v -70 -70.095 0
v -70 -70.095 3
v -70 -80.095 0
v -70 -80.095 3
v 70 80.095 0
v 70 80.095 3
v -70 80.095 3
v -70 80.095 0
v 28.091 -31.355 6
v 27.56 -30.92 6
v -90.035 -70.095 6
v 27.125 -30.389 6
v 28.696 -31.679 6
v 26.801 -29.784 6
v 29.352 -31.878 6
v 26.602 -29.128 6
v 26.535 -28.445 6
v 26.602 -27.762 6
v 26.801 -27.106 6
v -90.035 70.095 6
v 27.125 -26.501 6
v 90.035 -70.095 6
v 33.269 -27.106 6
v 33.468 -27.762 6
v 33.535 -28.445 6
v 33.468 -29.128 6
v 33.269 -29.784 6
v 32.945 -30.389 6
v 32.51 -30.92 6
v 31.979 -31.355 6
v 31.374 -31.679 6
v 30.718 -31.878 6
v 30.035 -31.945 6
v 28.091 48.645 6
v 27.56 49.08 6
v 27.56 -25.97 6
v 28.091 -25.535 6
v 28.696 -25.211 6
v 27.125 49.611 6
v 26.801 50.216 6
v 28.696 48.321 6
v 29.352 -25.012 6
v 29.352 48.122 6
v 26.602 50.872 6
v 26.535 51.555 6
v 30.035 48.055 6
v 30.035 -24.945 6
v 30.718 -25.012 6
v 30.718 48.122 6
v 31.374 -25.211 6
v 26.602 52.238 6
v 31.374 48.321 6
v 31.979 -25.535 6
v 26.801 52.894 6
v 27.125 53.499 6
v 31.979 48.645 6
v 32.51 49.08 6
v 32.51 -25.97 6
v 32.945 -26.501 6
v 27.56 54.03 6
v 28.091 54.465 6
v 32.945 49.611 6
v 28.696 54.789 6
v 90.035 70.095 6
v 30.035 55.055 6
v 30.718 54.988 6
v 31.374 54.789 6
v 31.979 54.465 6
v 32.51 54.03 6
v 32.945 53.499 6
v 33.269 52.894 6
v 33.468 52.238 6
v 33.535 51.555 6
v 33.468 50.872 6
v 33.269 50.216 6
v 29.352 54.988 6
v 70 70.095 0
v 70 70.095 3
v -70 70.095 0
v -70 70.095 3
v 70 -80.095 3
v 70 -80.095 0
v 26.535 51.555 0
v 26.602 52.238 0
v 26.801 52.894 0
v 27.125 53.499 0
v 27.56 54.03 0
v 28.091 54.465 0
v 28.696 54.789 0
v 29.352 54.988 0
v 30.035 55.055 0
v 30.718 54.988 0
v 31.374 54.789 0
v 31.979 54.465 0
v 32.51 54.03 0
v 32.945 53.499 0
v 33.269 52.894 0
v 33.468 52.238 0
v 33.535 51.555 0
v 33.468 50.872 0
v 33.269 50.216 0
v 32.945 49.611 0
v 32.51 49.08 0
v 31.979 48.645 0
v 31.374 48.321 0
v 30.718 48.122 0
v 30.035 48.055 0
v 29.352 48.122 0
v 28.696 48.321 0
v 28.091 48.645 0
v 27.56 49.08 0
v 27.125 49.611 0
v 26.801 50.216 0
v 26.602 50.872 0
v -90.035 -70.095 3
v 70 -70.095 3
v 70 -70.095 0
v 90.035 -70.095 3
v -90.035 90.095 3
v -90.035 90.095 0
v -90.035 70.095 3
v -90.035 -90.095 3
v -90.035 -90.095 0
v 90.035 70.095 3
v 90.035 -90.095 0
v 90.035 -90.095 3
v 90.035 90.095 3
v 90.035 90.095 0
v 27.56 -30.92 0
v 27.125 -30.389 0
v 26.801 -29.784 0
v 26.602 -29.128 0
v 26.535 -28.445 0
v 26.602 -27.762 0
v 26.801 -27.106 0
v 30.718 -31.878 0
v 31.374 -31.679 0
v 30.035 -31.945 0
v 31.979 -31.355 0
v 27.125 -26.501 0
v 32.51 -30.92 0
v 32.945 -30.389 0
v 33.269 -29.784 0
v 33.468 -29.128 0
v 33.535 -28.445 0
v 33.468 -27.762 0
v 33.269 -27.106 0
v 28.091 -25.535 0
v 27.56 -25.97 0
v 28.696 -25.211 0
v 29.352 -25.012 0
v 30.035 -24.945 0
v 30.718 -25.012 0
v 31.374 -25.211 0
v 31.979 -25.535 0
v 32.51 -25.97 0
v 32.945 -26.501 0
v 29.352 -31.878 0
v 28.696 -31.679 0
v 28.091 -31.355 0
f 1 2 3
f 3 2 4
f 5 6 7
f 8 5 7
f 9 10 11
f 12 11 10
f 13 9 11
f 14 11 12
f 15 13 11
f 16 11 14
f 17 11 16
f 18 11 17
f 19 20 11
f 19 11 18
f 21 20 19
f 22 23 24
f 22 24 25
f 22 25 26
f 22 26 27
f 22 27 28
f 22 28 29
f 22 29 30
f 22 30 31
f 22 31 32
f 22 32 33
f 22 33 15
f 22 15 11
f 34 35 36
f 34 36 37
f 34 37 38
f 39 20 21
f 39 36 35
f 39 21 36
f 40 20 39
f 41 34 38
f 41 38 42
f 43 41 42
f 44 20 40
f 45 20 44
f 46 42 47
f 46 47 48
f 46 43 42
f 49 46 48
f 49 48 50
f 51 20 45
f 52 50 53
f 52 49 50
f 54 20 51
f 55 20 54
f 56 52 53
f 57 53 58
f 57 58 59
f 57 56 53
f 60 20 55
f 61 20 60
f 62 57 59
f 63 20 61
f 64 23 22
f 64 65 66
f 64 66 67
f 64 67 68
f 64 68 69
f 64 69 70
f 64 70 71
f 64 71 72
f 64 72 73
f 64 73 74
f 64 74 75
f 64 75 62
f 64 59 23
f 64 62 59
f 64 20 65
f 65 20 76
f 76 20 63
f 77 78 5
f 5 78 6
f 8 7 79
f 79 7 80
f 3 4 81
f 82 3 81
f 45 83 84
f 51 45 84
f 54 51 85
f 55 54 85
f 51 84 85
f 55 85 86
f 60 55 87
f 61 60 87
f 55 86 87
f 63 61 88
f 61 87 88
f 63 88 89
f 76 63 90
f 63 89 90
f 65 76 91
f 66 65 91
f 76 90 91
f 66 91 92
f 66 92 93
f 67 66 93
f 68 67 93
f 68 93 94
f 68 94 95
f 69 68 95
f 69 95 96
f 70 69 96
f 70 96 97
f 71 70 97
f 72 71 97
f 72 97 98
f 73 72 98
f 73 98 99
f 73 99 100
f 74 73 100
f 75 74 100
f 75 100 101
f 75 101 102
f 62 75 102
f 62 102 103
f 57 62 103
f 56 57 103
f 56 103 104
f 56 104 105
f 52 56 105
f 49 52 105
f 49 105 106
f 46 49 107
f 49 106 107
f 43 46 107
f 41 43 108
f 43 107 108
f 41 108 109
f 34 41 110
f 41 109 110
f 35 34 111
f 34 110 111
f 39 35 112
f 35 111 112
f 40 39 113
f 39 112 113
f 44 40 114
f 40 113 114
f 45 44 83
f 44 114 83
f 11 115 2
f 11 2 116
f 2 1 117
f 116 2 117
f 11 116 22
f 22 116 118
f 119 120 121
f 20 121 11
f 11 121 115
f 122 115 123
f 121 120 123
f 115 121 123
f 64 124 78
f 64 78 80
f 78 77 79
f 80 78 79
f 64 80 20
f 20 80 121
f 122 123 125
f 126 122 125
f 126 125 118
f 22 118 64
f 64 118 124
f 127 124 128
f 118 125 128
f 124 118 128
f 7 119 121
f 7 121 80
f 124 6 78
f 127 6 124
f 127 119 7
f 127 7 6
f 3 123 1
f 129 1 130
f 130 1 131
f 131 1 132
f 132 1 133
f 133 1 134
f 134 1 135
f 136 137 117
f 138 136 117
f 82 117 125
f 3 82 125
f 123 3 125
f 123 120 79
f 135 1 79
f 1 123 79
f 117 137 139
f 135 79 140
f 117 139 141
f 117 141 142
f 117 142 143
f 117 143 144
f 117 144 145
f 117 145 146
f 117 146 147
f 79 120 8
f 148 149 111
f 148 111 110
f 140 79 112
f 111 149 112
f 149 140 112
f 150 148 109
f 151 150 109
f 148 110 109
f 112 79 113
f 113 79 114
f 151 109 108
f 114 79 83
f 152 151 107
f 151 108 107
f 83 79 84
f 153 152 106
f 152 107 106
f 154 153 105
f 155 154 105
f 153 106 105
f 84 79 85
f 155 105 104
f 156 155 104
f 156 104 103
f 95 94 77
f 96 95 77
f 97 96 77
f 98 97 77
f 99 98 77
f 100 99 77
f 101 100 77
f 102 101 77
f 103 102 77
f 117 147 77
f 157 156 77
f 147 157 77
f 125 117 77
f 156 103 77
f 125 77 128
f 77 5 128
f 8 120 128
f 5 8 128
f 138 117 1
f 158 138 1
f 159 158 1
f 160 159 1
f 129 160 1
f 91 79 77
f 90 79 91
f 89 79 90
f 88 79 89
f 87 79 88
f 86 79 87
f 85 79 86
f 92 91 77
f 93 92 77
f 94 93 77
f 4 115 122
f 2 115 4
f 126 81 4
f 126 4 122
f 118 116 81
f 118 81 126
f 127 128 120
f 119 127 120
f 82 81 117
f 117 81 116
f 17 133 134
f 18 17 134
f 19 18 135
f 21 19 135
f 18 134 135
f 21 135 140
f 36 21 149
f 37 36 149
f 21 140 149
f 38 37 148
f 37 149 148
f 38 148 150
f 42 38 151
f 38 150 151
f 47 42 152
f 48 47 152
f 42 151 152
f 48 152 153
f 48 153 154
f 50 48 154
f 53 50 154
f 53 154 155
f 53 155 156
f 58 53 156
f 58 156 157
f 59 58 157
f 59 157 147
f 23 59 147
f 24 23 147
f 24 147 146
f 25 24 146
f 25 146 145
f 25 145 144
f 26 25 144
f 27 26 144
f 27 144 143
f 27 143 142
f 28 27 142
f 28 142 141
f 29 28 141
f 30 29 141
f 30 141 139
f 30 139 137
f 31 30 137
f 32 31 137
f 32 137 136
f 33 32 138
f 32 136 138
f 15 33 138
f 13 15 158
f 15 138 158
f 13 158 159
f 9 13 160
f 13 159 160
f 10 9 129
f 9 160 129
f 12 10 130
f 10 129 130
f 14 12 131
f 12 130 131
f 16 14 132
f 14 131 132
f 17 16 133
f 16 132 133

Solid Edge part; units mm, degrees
sketch "Sketch1" plane through (0, 0, 0) normal (0, 0, 1) x (1, 0, 0)
  line L0 (-90.035, -90.095) -> (90.035, -90.095)
  line L1 (90.035, -90.095) -> (90.035, 90.095)
  line L2 (90.035, 90.095) -> (-90.035, 90.095)
  line L3 (-90.035, 90.095) -> (-90.035, -90.095)
  dimension "D1" = 180.07
  dimension "D2" = 180.19
extrude "Protrusion1" add sketch "Sketch1" along normal blind 3
sketch "Sketch2" plane through (0, 0, 3) normal (0, 0, 1) x (1, 0, 0)
  line L0 (-90.035, -70.095) -> (90.035, -70.095)
  line L1 (90.035, -70.095) -> (90.035, 70.095)
  line L2 (90.035, 70.095) -> (-90.035, 70.095)
  line L3 (-90.035, 70.095) -> (-90.035, -70.095)
  dimension "D1" = 20
extrude "Extrusionsausprägung_2" add sketch "Sketch2" along normal blind 3
sketch "Sketch3" plane through (0, -90, 3) normal (0, 0, 1) x (1, 0, 0)
  line L0 (-70, 9.905) -> (70, 9.905)
  line L1 (70, 9.905) -> (70, 19.905)
  line L2 (70, 19.905) -> (-70, 19.905)
  line L3 (-70, 19.905) -> (-70, 9.905)
  dimension "D1" = 140
extrude "Cutout1" cut sketch "Sketch3" against normal through all
mirror "Mirror1" about plane through (0, 0, 0) normal (0, -1, 0) of "Cutout1"
sketch "Sketch4" plane through (0, 0, 0) normal (0, 0, -1) x (-1, 0, 0)
  circle A0 centre (-30.035, -28.445) radius 3.5
  circle A1 centre (-30.035, 51.555) radius 3.5
  dimension "D1" = 80
  dimension "D2" = 7
  dimension "D3" = 61.65
  dimension "D4" = 60
extrude "Cutout3" cut sketch "Sketch4" against normal through all
properties material "Nylon, allgemein"
